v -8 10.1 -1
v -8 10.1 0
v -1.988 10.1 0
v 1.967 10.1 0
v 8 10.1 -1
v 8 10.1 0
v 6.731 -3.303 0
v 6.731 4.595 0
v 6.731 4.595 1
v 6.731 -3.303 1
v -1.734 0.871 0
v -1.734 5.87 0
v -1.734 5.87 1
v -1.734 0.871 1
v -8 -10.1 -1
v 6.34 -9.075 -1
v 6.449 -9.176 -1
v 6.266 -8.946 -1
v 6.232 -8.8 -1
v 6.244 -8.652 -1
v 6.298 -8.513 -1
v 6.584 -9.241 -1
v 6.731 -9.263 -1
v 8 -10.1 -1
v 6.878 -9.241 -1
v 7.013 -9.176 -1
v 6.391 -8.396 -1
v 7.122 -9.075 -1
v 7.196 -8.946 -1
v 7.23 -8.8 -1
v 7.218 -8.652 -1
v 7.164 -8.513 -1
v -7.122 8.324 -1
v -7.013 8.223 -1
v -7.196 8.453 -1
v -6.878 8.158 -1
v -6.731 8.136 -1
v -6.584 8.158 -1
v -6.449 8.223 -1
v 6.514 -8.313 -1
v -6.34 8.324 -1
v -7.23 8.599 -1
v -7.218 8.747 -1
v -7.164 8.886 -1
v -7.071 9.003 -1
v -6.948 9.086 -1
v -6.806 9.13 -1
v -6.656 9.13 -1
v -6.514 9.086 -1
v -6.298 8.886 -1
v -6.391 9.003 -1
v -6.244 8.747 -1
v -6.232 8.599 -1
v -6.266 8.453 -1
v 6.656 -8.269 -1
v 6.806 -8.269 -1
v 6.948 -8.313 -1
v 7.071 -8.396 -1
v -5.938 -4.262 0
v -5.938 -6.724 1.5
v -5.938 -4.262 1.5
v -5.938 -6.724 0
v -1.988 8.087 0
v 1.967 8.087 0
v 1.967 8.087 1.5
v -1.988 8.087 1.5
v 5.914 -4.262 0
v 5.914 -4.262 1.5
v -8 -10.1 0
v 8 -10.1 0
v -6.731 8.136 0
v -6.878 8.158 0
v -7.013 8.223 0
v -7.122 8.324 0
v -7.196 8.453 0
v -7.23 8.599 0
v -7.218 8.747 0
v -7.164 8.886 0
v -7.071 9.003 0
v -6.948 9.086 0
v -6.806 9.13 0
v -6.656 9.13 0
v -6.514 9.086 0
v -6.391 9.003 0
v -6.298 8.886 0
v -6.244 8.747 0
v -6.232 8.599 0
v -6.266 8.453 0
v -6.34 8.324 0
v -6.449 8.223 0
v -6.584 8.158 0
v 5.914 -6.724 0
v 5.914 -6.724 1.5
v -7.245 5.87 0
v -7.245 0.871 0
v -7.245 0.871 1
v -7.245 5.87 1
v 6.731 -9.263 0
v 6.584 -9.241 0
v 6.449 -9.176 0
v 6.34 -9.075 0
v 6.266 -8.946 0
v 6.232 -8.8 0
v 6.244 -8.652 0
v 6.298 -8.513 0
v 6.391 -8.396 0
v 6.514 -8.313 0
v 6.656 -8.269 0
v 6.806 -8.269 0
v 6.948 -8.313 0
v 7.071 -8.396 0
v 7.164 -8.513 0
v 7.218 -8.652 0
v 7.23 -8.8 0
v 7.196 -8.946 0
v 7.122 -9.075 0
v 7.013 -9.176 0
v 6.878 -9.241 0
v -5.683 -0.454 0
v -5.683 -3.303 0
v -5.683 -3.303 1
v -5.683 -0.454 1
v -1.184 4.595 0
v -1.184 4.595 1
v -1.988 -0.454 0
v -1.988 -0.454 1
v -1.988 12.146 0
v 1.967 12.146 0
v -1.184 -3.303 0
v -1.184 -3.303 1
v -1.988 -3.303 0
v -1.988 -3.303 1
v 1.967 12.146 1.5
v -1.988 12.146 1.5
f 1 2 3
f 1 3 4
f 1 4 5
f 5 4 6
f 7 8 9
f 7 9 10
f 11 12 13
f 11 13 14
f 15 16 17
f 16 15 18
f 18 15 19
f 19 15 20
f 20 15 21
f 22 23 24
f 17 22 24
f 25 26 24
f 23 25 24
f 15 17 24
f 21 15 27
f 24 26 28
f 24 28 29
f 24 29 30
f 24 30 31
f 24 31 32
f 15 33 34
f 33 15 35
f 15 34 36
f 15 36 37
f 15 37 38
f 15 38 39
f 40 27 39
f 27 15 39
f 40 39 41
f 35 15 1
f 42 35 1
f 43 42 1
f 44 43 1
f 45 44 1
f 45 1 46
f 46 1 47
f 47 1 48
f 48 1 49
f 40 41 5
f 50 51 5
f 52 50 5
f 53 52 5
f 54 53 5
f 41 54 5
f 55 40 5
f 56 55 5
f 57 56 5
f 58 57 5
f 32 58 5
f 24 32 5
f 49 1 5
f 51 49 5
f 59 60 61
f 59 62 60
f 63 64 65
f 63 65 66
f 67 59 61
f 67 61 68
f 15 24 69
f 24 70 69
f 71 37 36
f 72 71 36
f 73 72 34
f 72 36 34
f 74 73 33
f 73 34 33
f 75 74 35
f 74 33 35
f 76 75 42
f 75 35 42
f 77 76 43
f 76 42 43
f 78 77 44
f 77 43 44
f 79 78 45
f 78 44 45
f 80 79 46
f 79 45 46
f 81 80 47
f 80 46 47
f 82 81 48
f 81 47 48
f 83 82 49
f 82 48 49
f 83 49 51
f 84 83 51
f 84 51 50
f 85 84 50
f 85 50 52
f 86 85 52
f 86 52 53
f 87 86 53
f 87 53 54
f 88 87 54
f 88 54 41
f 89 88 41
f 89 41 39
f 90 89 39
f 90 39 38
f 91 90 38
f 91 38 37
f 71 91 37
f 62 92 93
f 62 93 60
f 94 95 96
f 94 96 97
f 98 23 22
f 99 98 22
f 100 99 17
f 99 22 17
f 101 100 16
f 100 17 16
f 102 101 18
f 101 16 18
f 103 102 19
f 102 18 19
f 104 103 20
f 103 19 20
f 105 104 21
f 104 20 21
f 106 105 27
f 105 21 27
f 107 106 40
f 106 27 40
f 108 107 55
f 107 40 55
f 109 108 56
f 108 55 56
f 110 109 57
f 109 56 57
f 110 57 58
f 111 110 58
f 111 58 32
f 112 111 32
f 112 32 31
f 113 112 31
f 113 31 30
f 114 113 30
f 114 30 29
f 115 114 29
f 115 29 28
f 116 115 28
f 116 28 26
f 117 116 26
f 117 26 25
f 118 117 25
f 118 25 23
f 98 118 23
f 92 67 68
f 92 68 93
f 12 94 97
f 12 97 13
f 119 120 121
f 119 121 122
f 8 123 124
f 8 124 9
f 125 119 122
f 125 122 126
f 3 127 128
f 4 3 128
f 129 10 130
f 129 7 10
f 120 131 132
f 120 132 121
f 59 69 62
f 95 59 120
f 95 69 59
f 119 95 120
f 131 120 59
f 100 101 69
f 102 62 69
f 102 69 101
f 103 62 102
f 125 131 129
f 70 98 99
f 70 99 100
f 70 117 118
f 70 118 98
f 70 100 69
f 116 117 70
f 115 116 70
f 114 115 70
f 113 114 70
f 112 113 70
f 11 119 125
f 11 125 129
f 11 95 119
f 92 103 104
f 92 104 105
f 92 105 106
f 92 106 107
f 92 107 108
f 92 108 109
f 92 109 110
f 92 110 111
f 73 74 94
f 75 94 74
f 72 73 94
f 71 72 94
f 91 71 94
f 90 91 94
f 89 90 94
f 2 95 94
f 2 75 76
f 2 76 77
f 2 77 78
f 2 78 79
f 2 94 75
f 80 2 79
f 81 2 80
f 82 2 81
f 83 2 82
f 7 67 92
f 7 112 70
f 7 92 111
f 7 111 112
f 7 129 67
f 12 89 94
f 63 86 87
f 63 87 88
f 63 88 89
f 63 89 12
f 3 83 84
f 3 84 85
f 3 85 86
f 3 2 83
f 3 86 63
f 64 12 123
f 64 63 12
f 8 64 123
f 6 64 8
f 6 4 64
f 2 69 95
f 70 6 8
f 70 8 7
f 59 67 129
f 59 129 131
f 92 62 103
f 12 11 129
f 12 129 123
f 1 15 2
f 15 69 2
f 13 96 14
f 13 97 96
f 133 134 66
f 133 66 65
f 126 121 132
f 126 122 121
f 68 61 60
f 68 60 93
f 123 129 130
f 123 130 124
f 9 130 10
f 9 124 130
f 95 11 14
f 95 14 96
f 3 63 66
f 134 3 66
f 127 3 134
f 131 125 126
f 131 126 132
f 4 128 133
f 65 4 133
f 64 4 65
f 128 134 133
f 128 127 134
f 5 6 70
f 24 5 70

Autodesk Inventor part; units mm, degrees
ref_plane "YZ Plane" through (0, 0, 0) normal (1, 0, 0) x (0, 1, 0)
ref_plane "XZ Plane" through (0, 0, 0) normal (0, 1, 0) x (-1, 0, 0)
ref_plane "XY Plane" through (0, 0, 0) normal (0, 0, 1) x (1, 0, 0)
sketch "Sketch1" plane through (0, 0, 0) normal (0, 0, 1) x (1, 0, 0)
  line L0 (0, 133.1936) -> (0, -174.4071) projected
  line L1 (-87.3177, 0) -> (127.2932, 0) projected
  line L2 (8, -10.1) -> (-8, -10.1)
  line L3 (-8, -10.1) -> (-8, 10.1)
  line L4 (-8, 10.1) -> (8, 10.1)
  line L5 (8, 10.1) -> (8, -10.1)
  line L6 (8, -10.1) -> (-8, 10.1) construction
  line L7 (-8, -10.1) -> (8, 10.1) construction
  circle A0 centre (-6.731, 8.636) radius 0.5139 construction
  circle A1 centre (6.731, -8.763) radius 0.49 construction
  line L8 (-5.9376, -4.2616) -> (5.9143, -4.2616)
  line L9 (5.9143, -4.2616) -> (5.9143, -6.7235)
  line L10 (5.9143, -6.7235) -> (-5.9376, -6.7235)
  line L11 (-5.9376, -6.7235) -> (-5.9376, -4.2616)
  line L12 (-1.9876, 12.1457) -> (1.9674, 12.1457)
  line L13 (1.9674, 12.1457) -> (1.9674, 8.0874)
  line L14 (1.9674, 8.0874) -> (-1.9876, 8.0874)
  line L15 (-1.9876, 8.0874) -> (-1.9876, 12.1457)
  line L16 (-7.2449, 5.8703) -> (-1.7339, 5.8703)
  line L17 (-1.7339, 5.8703) -> (-1.7339, 0.8708)
  line L18 (-1.7339, 0.8708) -> (-7.2449, 0.8708)
  line L19 (-7.2449, 0.8708) -> (-7.2449, 5.8703)
  line L20 (-5.683, -0.4539) -> (-1.9876, -0.4539)
  line L21 (-1.9876, -0.4539) -> (-1.9876, -3.3033)
  line L22 (-1.9876, -3.3033) -> (-5.683, -3.3033)
  line L23 (-5.683, -3.3033) -> (-5.683, -0.4539)
  line L24 (-1.184, 4.5949) -> (6.731, 4.5949)
  line L25 (6.731, 4.5949) -> (6.731, -3.3033)
  line L26 (6.731, -3.3033) -> (-1.184, -3.3033)
  line L27 (-1.184, -3.3033) -> (-1.184, 4.5949)
  line L28 (54.8091, 13.2903) -> (96.6345, 13.2903) construction
  line L29 (96.6345, 13.2903) -> (96.6345, -86.1085) construction
  line L30 (96.6345, -86.1085) -> (54.8091, -86.1085) construction
  line L31 (54.8091, -86.1085) -> (54.8091, 13.2903) construction
  line L32 (-7.642, -75.3683) -> (-7.642, -85.3683)
  line L33 (71.1512, 85.7776) -> (64.977, -130.4641) construction
  line L34 (64.977, -130.4641) -> (-56.659, -126.9911) construction
  line L35 (-56.659, -126.9911) -> (-50.4848, 89.2506) construction
  line L36 (-50.4848, 89.2506) -> (71.1512, 85.7776) construction
  point P0 (0, 0)
  dimension "d0" = 16
  dimension "d54" = 20.2
  dimension "d67" = 8.636
  dimension "d68" = 6.731
  dimension "d69" = 8.763
  dimension "d70" = 6.731
  dimension "d173" = 17.399
  dimension "d175" = 10
  dimension "d232" = 13.462
extrude "Extrusion1" add sketch "Sketch1" against normal blind 1 contours L4 L13 L14 L0 | L0 L14 L15 L4 | L14 L13 L4 L5 L1 L25 L24 L0 | L0 L24 L27 L1 L3 L4 L15 L14 | L24 L25 L1 L0 | L0 L1 L27 L24 | L1 L25 L26 L0 | L0 L26 L27 L1 | L1 L27 L26 L0 L8 L11 L10 L2 L3 | L5 L2 L0 L10 L9 L8 L26 L25 L1 | L8 L9 L10 L0 | L0 L10 L11 L8 | L16 L17 L18 L19 | L20 L21 L22 L23
extrude "Extrusion2" add sketch "Sketch1" along normal blind 1 contours L24 L25 L1 L0 | L0 L1 L27 L24 | L1 L25 L26 L0 | L0 L26 L27 L1 | L16 L17 L18 L19 | L20 L21 L22 L23
extrude "Extrusion3" add sketch "Sketch1" along normal blind 1.5 contours L12 L13 L4 L0 | L0 L4 L15 L12 | L4 L13 L14 L0 | L0 L14 L15 L4 | L8 L9 L10 L0 | L0 L10 L11 L8
hole "Hole1" at (6.731, -8.763, 0) at (-6.731, 8.636, 0) direction (0, 0, -1) diameter 1 depth 25.4 tip angle 118
